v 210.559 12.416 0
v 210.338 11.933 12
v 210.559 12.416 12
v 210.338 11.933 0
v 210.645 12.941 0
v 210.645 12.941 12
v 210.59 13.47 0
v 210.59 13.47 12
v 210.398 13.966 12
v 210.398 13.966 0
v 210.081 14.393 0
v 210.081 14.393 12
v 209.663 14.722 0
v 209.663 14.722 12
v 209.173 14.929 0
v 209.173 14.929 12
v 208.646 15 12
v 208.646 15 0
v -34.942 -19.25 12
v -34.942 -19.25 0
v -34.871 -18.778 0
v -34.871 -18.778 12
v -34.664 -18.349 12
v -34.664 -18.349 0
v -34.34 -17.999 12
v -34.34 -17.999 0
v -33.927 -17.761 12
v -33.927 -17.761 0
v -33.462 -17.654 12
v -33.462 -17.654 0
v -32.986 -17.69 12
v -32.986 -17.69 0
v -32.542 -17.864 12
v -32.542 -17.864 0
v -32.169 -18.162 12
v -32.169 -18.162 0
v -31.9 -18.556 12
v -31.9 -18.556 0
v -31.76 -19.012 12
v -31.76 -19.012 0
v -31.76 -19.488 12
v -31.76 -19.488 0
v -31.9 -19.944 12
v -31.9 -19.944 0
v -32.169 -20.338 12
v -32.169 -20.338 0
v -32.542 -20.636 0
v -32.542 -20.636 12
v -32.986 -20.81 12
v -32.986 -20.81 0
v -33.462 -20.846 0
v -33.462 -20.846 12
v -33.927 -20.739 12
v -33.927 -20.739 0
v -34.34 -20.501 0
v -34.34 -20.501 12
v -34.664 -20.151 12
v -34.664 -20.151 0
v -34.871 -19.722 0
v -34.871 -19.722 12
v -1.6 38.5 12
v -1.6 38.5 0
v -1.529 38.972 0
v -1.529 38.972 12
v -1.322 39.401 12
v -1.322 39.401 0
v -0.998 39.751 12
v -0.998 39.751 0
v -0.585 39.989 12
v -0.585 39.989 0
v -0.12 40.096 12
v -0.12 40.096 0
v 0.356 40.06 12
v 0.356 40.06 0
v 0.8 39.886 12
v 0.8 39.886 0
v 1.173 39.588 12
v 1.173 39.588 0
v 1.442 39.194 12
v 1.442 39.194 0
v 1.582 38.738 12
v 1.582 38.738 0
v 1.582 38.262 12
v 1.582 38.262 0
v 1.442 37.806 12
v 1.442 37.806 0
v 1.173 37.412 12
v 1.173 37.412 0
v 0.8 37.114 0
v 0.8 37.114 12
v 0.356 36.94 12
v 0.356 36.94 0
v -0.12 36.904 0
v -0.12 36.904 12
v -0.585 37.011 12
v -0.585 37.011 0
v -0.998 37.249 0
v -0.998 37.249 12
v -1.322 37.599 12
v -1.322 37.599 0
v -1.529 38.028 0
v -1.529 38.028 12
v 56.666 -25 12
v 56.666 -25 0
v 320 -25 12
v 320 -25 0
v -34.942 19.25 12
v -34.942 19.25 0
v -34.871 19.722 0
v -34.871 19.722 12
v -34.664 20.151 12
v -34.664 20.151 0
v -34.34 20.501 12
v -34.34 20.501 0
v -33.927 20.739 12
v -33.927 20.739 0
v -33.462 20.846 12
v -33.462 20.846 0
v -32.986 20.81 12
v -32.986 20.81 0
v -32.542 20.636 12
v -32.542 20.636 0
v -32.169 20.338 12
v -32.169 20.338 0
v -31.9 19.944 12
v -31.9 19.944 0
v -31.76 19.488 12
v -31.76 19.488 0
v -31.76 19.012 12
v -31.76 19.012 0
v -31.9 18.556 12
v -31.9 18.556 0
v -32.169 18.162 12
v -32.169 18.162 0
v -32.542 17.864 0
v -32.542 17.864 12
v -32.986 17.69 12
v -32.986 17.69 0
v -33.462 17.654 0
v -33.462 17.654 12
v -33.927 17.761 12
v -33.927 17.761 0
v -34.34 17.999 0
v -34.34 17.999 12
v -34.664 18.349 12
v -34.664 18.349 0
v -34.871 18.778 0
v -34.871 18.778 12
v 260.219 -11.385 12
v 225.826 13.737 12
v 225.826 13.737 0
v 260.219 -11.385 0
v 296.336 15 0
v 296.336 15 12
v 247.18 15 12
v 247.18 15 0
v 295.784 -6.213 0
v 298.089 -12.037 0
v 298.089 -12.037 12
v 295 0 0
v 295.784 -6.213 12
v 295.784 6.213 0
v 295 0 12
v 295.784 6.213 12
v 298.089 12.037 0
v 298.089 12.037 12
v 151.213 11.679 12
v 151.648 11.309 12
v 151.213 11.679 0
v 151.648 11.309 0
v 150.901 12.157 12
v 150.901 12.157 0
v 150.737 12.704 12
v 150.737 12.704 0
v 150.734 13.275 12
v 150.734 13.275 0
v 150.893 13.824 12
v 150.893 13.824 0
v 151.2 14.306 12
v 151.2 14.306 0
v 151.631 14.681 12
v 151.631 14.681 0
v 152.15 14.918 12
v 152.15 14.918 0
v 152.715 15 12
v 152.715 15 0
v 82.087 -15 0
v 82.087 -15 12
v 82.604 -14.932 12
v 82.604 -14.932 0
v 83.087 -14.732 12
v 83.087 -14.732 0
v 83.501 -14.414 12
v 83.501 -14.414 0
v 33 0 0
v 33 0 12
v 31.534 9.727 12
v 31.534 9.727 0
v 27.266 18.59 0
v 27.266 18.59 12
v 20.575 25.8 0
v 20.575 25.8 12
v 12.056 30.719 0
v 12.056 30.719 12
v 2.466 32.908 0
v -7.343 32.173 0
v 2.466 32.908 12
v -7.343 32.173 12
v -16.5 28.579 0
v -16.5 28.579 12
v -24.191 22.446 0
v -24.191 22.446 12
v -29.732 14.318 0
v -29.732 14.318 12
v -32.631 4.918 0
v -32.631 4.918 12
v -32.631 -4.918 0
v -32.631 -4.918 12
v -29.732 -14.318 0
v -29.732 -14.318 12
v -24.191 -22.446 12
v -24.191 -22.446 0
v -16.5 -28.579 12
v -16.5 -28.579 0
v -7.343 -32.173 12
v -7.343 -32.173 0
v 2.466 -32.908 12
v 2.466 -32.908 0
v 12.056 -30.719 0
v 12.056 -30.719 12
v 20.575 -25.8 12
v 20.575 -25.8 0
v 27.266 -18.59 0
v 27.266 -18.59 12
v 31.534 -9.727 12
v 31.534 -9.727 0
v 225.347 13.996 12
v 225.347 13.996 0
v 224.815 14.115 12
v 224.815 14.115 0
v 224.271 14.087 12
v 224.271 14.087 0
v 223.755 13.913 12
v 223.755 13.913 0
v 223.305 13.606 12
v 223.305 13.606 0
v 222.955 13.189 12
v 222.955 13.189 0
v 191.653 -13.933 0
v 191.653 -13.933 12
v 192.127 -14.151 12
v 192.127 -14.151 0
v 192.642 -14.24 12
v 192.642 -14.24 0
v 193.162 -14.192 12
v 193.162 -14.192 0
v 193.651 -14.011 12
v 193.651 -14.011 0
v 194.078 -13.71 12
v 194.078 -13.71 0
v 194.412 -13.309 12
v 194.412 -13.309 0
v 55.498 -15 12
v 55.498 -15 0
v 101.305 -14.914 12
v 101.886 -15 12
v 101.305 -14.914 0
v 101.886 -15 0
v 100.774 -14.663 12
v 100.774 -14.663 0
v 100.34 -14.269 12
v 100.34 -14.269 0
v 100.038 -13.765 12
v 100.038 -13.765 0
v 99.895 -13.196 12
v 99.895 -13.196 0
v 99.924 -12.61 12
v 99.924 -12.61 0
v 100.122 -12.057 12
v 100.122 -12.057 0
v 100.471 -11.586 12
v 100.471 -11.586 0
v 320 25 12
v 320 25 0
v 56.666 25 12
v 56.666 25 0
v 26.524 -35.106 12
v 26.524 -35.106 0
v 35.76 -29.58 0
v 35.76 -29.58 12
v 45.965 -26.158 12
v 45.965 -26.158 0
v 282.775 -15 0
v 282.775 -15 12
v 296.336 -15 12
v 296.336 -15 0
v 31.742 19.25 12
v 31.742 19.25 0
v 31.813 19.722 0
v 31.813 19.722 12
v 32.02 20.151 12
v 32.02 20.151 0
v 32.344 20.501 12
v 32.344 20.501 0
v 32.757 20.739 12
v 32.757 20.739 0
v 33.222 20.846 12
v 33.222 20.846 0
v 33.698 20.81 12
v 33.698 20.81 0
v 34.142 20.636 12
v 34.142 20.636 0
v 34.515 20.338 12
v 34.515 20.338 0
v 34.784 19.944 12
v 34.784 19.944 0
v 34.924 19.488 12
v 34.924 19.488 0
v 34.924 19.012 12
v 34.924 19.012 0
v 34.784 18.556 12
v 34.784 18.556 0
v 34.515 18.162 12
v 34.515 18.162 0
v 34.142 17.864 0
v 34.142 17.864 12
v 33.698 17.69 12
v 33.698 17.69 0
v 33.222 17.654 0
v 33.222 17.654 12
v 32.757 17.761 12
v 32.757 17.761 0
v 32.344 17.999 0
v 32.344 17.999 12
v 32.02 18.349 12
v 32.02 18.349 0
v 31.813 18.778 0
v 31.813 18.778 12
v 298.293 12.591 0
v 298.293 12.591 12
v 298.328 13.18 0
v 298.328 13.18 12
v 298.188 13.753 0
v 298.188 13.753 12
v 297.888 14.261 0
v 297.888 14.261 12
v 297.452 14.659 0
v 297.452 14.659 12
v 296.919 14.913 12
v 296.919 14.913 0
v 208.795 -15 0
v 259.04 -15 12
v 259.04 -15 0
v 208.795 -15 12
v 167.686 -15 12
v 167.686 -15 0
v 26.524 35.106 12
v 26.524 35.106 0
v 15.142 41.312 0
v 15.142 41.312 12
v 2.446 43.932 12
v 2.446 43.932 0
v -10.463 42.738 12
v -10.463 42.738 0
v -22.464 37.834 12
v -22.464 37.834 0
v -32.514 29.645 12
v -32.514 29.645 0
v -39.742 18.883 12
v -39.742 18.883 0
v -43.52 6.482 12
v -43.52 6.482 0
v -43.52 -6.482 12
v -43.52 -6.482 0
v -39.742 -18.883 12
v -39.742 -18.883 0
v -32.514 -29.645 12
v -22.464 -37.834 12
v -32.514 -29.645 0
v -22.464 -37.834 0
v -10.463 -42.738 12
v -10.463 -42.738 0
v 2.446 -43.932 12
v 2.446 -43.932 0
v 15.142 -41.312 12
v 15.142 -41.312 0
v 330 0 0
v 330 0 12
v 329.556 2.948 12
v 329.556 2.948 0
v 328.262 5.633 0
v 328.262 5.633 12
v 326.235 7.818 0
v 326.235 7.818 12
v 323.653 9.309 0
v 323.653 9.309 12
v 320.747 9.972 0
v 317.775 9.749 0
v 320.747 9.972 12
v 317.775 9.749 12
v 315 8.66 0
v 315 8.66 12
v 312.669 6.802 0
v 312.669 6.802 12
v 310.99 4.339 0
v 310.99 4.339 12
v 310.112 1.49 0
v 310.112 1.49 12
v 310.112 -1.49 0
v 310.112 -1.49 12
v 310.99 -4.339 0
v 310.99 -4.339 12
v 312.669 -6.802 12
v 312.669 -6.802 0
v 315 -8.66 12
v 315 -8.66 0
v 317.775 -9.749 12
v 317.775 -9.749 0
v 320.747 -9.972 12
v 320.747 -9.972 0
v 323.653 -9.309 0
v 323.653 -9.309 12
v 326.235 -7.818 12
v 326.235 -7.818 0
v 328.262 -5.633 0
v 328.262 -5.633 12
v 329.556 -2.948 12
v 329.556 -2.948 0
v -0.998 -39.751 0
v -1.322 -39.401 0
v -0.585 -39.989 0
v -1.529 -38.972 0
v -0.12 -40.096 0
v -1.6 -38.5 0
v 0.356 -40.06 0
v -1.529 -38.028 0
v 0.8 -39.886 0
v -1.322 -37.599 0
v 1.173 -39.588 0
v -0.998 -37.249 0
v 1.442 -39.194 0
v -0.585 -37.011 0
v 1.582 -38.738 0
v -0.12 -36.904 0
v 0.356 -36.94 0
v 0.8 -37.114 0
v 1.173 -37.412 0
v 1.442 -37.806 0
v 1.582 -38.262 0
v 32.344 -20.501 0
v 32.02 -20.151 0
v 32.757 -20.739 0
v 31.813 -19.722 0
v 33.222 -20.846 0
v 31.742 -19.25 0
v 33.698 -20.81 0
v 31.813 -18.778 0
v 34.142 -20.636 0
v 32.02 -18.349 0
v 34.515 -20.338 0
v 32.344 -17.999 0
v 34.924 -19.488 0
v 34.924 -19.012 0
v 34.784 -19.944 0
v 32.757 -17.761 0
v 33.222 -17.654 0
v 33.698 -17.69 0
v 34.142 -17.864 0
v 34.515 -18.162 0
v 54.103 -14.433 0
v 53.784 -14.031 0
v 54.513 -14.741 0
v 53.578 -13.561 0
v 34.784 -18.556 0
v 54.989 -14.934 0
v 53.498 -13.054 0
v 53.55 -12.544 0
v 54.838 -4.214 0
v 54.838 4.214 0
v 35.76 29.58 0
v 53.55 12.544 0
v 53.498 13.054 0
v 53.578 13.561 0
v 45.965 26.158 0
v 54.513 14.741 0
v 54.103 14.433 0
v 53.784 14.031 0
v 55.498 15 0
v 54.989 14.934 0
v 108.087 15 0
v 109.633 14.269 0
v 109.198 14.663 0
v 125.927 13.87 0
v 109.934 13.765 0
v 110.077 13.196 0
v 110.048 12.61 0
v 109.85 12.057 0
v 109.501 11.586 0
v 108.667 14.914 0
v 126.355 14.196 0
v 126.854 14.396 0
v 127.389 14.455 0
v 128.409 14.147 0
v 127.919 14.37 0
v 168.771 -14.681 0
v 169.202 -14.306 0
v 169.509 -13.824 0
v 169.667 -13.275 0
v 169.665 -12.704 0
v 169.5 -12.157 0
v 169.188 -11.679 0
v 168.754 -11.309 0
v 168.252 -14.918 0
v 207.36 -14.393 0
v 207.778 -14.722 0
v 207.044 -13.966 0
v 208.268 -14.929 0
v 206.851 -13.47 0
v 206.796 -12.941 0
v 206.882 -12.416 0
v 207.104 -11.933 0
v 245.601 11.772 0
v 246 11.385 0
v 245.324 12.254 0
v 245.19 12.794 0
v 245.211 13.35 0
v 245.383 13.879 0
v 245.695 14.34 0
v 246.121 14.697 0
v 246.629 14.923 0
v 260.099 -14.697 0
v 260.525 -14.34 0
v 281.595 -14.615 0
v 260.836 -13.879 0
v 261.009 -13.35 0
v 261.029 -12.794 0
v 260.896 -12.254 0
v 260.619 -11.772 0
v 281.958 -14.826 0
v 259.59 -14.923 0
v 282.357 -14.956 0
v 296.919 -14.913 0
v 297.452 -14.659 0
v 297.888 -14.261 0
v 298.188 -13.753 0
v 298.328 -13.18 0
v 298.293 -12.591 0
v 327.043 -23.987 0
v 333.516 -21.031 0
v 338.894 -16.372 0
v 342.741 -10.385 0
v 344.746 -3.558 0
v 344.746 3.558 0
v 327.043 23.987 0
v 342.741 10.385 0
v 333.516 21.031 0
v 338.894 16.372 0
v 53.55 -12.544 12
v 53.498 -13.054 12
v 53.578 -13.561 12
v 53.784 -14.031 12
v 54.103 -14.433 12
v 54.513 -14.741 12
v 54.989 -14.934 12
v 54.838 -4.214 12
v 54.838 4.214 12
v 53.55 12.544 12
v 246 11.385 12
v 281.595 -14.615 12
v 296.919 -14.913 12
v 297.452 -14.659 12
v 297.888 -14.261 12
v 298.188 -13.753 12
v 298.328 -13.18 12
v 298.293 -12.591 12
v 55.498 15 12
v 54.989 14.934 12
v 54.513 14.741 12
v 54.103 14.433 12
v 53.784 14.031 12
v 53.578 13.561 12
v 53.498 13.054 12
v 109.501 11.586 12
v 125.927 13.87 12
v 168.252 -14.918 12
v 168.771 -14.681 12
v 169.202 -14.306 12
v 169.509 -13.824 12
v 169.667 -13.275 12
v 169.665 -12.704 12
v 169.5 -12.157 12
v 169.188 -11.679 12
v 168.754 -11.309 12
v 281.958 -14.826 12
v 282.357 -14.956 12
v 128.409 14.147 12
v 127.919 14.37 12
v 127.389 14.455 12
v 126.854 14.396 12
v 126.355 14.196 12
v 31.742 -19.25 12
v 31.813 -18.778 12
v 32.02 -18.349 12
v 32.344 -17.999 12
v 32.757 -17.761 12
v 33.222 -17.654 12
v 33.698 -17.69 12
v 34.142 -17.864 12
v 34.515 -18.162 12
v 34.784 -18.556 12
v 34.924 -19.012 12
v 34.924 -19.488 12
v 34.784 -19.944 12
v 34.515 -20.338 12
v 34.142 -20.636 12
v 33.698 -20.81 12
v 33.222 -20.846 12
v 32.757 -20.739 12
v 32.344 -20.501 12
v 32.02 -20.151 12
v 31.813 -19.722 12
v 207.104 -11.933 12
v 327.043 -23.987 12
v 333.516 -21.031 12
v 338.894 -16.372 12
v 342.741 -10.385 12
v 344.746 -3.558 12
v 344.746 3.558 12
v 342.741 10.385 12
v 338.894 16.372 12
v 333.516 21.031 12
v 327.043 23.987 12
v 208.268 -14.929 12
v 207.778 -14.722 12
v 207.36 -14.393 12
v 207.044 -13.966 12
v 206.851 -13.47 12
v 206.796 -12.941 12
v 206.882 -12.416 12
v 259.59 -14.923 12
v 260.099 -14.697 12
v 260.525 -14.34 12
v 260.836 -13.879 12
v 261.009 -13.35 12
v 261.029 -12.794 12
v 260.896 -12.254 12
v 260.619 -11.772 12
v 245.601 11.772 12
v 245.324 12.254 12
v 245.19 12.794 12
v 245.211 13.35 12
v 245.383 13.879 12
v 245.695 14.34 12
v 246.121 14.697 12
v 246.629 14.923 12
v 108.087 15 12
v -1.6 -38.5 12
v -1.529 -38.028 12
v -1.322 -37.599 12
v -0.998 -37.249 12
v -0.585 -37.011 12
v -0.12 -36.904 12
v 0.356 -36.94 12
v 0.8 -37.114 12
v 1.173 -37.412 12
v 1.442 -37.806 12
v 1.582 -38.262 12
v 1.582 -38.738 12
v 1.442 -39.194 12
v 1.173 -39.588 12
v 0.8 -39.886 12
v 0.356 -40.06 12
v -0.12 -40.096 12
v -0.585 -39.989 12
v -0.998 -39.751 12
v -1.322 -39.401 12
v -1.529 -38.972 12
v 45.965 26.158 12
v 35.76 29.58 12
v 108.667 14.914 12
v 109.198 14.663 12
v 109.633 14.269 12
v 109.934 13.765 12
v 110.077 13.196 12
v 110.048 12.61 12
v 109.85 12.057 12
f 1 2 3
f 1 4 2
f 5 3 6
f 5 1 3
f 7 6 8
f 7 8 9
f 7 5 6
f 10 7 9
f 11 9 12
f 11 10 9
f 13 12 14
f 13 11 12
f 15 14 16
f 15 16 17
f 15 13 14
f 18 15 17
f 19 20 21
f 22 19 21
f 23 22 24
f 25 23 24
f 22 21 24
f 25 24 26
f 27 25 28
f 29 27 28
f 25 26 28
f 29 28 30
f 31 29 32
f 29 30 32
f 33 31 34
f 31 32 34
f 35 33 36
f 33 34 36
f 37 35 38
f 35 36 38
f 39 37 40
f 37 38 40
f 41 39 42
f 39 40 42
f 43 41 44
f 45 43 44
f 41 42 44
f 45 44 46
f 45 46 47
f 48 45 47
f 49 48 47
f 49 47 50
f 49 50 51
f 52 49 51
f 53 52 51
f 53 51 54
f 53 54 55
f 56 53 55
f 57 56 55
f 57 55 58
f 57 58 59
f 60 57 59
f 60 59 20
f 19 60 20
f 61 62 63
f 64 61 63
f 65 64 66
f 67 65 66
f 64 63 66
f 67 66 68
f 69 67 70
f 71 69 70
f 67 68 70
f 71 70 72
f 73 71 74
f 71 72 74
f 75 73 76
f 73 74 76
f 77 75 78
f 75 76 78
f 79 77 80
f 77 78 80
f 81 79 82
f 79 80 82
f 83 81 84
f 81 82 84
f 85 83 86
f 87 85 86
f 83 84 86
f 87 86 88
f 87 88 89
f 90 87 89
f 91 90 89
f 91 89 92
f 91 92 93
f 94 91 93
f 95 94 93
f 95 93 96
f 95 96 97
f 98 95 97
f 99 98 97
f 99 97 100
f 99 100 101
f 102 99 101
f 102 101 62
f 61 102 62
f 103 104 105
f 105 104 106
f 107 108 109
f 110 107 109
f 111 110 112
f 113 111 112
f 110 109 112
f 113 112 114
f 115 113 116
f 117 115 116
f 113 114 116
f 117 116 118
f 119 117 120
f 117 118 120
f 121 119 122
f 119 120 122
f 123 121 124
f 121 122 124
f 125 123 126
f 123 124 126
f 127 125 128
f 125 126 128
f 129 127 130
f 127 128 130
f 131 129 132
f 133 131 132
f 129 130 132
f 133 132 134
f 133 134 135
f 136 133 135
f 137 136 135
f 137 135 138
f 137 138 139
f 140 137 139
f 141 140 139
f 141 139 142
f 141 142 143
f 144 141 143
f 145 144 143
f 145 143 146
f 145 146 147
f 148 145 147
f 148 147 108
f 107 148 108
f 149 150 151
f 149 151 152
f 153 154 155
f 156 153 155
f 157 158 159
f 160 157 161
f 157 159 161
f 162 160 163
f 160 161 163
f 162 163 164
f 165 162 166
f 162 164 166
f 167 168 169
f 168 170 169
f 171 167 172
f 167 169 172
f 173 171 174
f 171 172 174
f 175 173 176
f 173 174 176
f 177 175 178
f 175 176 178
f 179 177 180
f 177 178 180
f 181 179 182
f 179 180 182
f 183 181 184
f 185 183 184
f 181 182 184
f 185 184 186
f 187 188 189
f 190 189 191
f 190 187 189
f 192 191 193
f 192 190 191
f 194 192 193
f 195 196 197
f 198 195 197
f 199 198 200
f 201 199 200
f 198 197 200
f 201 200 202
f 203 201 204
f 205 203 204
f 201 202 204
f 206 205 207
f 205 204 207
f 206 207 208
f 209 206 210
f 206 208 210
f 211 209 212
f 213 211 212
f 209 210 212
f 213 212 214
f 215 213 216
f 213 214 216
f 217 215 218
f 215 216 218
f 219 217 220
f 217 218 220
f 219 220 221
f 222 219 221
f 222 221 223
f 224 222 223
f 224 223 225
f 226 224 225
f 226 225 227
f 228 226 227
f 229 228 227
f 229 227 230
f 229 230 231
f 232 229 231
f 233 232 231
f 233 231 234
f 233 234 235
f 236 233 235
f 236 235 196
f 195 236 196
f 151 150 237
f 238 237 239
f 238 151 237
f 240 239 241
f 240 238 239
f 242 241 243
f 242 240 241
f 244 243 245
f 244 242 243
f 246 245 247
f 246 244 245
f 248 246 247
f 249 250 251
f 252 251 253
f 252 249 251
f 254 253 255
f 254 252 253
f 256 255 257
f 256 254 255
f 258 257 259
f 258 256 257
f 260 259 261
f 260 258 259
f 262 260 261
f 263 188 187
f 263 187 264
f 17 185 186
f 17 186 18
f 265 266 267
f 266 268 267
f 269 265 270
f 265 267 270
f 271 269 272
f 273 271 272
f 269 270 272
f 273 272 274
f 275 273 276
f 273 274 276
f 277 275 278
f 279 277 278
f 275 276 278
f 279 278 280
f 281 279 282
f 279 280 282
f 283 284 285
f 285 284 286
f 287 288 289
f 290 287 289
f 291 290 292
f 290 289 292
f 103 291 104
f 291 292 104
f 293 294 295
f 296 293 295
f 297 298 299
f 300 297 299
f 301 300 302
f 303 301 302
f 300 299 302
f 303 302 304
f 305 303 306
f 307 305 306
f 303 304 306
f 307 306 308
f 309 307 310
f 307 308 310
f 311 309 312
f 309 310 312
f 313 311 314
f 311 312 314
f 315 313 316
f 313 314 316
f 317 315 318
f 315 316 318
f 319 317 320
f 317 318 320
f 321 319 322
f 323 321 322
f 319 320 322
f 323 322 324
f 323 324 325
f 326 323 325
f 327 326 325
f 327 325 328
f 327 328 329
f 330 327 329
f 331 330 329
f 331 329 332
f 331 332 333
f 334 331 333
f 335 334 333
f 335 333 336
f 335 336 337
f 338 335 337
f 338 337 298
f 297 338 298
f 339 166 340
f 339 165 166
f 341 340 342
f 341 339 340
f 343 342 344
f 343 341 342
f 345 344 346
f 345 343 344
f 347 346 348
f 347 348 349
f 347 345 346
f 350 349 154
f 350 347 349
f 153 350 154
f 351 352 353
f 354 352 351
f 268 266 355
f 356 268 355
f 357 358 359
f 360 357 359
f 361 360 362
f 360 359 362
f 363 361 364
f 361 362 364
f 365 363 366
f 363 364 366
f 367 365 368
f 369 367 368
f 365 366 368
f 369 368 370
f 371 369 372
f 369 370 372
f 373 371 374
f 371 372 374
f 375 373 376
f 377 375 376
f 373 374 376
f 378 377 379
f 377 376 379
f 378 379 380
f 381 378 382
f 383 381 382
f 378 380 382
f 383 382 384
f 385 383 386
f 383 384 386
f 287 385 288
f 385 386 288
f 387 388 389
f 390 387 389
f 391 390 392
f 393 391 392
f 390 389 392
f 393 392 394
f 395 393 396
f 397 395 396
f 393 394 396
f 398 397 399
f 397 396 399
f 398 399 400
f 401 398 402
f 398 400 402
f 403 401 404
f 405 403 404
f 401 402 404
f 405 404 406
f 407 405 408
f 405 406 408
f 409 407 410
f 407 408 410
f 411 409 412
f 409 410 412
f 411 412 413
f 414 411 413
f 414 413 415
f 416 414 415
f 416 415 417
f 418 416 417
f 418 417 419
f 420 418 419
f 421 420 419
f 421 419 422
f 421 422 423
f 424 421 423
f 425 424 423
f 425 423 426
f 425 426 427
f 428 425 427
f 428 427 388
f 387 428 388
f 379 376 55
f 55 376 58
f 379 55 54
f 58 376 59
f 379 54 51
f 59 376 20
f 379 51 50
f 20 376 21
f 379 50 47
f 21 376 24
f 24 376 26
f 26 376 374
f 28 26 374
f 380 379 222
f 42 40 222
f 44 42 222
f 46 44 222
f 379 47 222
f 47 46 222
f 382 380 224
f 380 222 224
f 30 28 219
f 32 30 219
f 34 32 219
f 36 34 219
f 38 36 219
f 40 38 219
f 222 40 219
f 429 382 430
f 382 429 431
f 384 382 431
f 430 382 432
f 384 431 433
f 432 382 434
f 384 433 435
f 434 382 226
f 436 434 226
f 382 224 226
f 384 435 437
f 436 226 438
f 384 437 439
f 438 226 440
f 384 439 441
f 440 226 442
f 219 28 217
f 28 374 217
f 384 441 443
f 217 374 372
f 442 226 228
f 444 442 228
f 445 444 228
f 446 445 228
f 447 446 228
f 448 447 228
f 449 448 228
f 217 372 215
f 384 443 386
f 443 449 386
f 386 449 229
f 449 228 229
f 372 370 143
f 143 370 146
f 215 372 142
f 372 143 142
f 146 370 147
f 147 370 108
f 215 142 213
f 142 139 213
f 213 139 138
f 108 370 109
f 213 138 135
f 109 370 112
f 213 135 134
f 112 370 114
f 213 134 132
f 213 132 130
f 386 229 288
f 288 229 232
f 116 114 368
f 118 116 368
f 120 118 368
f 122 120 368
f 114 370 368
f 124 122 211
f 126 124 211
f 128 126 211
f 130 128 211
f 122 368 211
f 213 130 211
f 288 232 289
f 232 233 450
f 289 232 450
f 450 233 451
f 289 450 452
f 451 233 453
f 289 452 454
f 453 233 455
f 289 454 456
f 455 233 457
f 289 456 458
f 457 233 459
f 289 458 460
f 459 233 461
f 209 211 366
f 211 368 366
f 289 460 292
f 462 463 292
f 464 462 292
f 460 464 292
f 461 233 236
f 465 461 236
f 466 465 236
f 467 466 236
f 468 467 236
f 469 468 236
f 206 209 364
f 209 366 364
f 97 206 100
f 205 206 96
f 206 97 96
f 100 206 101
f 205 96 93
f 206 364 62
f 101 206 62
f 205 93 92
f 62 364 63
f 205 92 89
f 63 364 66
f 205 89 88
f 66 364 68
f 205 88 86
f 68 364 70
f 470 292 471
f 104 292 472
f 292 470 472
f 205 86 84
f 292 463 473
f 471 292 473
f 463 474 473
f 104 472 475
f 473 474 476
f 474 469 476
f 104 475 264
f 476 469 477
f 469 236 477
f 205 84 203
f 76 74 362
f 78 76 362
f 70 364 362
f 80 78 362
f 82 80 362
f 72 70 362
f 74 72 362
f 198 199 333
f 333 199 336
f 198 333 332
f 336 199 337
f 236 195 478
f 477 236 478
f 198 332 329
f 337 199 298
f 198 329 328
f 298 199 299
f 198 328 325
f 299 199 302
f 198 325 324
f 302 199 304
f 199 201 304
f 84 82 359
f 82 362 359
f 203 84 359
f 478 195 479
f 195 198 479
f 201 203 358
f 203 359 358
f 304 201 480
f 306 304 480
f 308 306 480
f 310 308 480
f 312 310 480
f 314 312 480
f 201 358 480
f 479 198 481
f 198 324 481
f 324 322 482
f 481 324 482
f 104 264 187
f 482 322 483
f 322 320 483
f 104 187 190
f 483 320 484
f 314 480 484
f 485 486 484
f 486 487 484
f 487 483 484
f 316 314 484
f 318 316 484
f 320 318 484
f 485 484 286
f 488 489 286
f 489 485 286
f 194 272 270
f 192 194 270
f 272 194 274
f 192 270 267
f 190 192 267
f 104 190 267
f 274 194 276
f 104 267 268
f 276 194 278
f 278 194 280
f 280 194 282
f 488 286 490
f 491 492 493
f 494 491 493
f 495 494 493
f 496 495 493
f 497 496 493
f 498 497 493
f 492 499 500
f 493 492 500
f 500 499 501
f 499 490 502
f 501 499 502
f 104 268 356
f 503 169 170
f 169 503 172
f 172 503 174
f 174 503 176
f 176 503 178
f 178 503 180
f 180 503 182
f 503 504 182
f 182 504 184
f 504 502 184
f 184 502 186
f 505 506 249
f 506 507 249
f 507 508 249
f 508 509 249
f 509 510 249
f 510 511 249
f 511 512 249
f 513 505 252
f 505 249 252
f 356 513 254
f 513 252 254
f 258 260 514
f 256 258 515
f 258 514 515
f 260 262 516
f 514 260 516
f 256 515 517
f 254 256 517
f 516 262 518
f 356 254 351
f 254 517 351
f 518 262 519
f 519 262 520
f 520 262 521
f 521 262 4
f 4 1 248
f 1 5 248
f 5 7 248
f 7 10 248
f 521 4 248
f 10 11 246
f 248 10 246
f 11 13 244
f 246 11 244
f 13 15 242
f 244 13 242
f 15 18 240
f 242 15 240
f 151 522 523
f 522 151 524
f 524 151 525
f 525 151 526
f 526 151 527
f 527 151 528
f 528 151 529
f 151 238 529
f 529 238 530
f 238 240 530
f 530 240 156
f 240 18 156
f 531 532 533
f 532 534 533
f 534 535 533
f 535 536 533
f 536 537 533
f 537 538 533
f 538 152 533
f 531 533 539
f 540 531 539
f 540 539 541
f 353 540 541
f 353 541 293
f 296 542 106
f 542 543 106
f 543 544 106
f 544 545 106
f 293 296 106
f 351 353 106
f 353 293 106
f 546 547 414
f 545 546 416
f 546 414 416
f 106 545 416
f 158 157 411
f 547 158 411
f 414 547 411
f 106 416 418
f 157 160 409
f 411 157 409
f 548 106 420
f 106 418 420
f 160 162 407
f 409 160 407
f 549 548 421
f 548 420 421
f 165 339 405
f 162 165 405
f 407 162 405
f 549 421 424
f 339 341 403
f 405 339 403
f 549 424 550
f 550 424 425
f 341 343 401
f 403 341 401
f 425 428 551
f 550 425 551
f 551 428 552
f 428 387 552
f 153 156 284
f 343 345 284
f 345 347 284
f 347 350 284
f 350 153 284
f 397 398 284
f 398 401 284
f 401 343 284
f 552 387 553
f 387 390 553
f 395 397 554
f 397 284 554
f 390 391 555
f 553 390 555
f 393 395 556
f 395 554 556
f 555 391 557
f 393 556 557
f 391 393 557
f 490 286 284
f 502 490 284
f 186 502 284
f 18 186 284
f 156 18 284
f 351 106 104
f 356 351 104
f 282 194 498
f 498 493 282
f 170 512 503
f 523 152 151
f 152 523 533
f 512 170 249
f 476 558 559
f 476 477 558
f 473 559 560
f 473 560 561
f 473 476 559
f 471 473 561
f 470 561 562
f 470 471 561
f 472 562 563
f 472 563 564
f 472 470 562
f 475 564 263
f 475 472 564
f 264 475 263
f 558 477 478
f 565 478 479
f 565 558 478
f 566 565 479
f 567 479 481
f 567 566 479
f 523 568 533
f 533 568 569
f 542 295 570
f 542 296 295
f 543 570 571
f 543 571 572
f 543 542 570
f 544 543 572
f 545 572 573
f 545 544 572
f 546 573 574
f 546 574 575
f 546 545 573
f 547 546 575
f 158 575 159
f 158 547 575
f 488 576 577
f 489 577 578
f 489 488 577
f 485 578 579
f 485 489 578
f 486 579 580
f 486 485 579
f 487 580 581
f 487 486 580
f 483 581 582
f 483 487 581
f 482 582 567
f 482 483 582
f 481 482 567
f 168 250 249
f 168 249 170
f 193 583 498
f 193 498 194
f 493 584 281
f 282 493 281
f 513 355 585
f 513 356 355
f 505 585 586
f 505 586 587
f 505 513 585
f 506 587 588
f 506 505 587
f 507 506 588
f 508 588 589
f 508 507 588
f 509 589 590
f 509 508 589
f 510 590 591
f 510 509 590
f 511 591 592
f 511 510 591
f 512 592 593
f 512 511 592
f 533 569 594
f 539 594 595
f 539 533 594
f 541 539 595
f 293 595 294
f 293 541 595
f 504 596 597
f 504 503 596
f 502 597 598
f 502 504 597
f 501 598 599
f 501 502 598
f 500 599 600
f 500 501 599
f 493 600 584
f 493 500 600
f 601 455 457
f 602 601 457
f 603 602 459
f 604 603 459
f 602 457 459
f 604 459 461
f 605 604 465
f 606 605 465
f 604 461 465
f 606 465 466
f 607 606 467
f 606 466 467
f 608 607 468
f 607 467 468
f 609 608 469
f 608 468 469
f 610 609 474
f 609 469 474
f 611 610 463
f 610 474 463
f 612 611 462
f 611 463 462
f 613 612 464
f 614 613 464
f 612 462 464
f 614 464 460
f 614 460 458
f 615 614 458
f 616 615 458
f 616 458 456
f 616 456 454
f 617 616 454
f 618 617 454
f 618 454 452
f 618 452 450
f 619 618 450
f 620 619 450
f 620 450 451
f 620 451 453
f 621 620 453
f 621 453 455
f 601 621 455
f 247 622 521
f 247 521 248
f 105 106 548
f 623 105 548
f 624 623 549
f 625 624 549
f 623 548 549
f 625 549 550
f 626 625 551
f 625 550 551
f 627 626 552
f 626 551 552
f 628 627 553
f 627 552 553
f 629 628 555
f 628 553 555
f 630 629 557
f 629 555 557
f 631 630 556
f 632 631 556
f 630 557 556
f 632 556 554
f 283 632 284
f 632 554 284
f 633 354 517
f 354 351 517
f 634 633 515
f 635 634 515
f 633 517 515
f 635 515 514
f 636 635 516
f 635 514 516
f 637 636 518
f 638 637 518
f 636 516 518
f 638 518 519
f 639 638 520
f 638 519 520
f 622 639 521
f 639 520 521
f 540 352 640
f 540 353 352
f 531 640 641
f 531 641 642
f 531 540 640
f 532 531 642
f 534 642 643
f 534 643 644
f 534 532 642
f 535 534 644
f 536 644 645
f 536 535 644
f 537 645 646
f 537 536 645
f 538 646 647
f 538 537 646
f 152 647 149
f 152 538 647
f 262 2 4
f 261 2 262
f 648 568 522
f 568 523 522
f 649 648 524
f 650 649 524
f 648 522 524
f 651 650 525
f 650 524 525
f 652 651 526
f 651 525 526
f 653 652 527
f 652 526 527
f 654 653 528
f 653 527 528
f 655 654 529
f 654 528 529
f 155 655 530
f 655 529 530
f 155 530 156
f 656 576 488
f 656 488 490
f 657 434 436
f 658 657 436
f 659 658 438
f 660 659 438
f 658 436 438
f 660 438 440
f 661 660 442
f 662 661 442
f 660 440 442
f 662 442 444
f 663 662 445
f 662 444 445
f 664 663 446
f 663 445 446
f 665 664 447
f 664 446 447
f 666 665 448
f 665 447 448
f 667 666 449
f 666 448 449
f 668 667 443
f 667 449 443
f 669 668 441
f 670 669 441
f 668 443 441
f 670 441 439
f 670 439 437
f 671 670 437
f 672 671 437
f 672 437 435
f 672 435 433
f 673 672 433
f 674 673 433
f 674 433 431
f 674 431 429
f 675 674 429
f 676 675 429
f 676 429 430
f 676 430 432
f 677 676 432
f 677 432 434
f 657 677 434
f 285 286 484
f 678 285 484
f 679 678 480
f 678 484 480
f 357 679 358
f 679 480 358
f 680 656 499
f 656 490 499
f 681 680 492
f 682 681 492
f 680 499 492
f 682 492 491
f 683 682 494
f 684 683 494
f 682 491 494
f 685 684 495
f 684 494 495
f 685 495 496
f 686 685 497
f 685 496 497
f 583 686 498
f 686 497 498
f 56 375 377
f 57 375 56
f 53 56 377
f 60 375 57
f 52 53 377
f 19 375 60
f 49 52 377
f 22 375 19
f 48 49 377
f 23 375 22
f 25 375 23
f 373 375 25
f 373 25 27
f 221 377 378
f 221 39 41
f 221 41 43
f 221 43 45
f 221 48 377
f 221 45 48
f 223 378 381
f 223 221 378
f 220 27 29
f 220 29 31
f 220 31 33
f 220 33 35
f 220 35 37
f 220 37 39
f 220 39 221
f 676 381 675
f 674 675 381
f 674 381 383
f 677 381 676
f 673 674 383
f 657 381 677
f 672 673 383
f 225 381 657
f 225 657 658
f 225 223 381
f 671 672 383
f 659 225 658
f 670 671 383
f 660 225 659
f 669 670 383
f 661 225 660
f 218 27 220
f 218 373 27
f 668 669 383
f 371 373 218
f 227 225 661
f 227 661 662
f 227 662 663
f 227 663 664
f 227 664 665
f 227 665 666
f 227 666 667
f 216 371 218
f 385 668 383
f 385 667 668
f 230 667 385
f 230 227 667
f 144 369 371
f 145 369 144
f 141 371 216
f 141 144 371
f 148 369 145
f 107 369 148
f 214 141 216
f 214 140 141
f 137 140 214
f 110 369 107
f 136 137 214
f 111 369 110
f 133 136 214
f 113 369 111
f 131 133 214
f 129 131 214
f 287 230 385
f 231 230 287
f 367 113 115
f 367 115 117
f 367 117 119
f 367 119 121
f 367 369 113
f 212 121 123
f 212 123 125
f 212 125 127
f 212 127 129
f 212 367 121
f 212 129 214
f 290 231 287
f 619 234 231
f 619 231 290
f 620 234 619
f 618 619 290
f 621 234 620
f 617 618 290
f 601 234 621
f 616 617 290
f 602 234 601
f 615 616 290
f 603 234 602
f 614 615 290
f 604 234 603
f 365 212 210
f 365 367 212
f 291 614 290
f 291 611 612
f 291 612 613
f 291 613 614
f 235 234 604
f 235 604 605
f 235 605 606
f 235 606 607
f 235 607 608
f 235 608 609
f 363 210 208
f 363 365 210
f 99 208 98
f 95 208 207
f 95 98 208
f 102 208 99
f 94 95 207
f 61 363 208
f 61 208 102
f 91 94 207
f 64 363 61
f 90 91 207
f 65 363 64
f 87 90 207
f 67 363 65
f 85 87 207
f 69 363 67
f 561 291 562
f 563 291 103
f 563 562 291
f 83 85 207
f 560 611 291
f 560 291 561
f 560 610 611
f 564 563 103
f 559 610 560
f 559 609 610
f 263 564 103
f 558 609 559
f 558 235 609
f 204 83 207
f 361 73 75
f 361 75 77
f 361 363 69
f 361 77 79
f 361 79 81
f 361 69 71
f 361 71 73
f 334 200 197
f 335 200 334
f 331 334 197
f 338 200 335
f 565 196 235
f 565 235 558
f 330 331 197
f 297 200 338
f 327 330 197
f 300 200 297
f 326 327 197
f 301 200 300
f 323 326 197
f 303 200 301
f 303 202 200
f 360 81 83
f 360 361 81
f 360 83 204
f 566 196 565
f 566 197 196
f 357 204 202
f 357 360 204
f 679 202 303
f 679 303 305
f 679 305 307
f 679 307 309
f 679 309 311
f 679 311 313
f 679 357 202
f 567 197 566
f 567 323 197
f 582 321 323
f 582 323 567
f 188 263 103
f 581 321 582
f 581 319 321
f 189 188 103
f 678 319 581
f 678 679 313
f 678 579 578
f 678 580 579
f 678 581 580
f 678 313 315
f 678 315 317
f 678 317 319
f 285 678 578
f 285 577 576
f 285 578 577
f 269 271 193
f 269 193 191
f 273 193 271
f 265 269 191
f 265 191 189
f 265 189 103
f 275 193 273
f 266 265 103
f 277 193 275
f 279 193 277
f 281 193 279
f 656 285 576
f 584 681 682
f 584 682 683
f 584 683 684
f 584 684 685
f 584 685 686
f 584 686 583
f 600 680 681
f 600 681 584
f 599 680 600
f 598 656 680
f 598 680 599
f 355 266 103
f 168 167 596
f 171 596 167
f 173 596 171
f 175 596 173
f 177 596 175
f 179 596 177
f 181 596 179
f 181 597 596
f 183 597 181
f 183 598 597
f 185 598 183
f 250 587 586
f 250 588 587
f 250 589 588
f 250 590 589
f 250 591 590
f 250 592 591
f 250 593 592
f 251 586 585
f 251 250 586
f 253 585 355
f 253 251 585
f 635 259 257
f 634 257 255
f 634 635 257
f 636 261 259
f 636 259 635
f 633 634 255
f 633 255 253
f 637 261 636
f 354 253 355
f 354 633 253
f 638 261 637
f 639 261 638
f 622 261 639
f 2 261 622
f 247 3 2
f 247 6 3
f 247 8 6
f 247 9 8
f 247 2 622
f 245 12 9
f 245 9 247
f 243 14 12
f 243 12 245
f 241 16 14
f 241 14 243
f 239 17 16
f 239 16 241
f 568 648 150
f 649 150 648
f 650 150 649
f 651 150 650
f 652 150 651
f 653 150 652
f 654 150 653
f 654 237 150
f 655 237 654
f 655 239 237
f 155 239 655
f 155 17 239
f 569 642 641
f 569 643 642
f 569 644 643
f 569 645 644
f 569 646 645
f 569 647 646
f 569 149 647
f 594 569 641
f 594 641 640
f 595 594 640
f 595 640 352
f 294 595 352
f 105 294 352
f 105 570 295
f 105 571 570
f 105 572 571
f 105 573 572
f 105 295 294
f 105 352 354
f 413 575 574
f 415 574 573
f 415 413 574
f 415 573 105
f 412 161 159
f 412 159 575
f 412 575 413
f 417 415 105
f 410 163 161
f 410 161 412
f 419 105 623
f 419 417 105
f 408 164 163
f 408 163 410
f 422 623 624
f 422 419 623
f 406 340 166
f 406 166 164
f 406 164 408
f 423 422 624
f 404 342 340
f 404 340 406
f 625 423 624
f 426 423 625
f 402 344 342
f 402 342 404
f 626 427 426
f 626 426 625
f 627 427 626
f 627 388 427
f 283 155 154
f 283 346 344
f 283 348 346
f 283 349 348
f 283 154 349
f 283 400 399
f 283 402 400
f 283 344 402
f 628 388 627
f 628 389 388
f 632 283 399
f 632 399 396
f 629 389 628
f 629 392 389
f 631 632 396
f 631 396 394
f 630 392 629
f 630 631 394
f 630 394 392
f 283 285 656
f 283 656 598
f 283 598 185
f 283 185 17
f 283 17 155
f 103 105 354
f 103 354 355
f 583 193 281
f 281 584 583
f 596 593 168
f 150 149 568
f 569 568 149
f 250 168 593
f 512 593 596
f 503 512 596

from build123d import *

# Parameters (mm, degrees)
EXTRUDE_1_DEPTH         = 12
SKETCH_5_R              = 33
SKETCH_5_R_2            = 10
CUT_EXTRUDE_1_DEPTH     = 349.001436779
CUT_EXTRUDE_2_DEPTH     = 349.001436779
FILLET_1_R              = 2
HOLE_WIZARD_3_2_3_2_1_D = 3.2


with BuildPart() as part:
    # 草图1 → 凸台-拉伸1 (new body)
    with BuildSketch(Plane.XY):
        with BuildLine():
            Line((320, 25), (56.665686266, 25))
            ThreePointArc((56.665686266, 25), (40.770417333, 27.593877763), (26.524363784, 35.106382979))
            ThreePointArc((26.524363784, 35.106382979), (-44, 0), (26.524363784, -35.106382979))
            ThreePointArc((26.524363784, -35.106382979), (40.770417333, -27.593877763), (56.665686266, -25))
            Line((56.665686266, -25), (320, -25))
            ThreePointArc((320, -25), (345, 0), (320, 25))
        make_face()
    extrude(amount=EXTRUDE_1_DEPTH)

    # 草图5 → 切除-拉伸1 (cut, through all)
    with BuildSketch(Plane.XY.offset(12)):
        Circle(SKETCH_5_R)
        with Locations((320, 0)):
            Circle(SKETCH_5_R_2)
    extrude(amount=-CUT_EXTRUDE_1_DEPTH, mode=Mode.SUBTRACT)

    # 草图6 → 切除-拉伸2 (cut, through all)
    with BuildSketch(Plane.XY.offset(12)):
        with BuildLine():
            Line((112.915026221, 15), (82.915026221, -15))
            Line((82.915026221, -15), (72.915026221, -15))
            Line((72.915026221, -15), (52.915026221, -15))
            ThreePointArc((52.915026221, -15), (55, 0), (52.915026221, 15))
            Line((52.915026221, 15), (112.915026221, 15))
        make_face()
        Polygon((97.057161845, -15), (174.604308358, -15), (127.057161845, 15), align=None)
        Polygon((145.797288554, 15), (212.27301577, 15), (193.344435067, -15), align=None)
        Polygon((205.168568427, -15), (224.097149131, 15), (265.168568427, -15), align=None)
        with BuildLine():
            Line((241.050881866, 15), (282.122301163, -15))
            Line((282.122301163, -15), (300, -15))
            ThreePointArc((300, -15), (295, 0), (300, 15))
            Line((300, 15), (241.050881866, 15))
        make_face()
    extrude(amount=-CUT_EXTRUDE_2_DEPTH, mode=Mode.SUBTRACT)

    # 圆角1
    fillet_1_edges = [part.edges().sort_by_distance(p)[0] for p in [
        (97.057161845, -15, 6),
        (127.057161845, 15, 6),
        (174.604308358, -15, 6),
        (82.915026221, -15, 6),
        (52.915026221, -15, 6),
        (52.915026221, 15, 6),
        (112.915026221, 15, 6),
        (193.344435067, -15, 6),
        (145.797288554, 15, 6),
        (212.27301577, 15, 6),
        (241.050881866, 15, 6),
        (300, 15, 6),
        (300, -15, 6),
        (282.122301163, -15, 6),
        (265.168568427, -15, 6),
        (205.168568427, -15, 6),
        (224.097149131, 15, 6),
    ]]
    fillet(fillet_1_edges, radius=FILLET_1_R)

    # Ø3.2 (3.2) 直径孔1 (through all)
    with Locations(Plane(origin=(0, 38.5, 12), x_dir=(1, 0, 0), z_dir=(0, 0, 1))):
        with Locations((0, 0), (-33.341978046, -19.25), (-33.341978046, -57.75), (0, -77), (33.341978046, -57.75), (33.341978046, -19.25)):
            Hole(HOLE_WIZARD_3_2_3_2_1_D / 2)


solid = part.part
